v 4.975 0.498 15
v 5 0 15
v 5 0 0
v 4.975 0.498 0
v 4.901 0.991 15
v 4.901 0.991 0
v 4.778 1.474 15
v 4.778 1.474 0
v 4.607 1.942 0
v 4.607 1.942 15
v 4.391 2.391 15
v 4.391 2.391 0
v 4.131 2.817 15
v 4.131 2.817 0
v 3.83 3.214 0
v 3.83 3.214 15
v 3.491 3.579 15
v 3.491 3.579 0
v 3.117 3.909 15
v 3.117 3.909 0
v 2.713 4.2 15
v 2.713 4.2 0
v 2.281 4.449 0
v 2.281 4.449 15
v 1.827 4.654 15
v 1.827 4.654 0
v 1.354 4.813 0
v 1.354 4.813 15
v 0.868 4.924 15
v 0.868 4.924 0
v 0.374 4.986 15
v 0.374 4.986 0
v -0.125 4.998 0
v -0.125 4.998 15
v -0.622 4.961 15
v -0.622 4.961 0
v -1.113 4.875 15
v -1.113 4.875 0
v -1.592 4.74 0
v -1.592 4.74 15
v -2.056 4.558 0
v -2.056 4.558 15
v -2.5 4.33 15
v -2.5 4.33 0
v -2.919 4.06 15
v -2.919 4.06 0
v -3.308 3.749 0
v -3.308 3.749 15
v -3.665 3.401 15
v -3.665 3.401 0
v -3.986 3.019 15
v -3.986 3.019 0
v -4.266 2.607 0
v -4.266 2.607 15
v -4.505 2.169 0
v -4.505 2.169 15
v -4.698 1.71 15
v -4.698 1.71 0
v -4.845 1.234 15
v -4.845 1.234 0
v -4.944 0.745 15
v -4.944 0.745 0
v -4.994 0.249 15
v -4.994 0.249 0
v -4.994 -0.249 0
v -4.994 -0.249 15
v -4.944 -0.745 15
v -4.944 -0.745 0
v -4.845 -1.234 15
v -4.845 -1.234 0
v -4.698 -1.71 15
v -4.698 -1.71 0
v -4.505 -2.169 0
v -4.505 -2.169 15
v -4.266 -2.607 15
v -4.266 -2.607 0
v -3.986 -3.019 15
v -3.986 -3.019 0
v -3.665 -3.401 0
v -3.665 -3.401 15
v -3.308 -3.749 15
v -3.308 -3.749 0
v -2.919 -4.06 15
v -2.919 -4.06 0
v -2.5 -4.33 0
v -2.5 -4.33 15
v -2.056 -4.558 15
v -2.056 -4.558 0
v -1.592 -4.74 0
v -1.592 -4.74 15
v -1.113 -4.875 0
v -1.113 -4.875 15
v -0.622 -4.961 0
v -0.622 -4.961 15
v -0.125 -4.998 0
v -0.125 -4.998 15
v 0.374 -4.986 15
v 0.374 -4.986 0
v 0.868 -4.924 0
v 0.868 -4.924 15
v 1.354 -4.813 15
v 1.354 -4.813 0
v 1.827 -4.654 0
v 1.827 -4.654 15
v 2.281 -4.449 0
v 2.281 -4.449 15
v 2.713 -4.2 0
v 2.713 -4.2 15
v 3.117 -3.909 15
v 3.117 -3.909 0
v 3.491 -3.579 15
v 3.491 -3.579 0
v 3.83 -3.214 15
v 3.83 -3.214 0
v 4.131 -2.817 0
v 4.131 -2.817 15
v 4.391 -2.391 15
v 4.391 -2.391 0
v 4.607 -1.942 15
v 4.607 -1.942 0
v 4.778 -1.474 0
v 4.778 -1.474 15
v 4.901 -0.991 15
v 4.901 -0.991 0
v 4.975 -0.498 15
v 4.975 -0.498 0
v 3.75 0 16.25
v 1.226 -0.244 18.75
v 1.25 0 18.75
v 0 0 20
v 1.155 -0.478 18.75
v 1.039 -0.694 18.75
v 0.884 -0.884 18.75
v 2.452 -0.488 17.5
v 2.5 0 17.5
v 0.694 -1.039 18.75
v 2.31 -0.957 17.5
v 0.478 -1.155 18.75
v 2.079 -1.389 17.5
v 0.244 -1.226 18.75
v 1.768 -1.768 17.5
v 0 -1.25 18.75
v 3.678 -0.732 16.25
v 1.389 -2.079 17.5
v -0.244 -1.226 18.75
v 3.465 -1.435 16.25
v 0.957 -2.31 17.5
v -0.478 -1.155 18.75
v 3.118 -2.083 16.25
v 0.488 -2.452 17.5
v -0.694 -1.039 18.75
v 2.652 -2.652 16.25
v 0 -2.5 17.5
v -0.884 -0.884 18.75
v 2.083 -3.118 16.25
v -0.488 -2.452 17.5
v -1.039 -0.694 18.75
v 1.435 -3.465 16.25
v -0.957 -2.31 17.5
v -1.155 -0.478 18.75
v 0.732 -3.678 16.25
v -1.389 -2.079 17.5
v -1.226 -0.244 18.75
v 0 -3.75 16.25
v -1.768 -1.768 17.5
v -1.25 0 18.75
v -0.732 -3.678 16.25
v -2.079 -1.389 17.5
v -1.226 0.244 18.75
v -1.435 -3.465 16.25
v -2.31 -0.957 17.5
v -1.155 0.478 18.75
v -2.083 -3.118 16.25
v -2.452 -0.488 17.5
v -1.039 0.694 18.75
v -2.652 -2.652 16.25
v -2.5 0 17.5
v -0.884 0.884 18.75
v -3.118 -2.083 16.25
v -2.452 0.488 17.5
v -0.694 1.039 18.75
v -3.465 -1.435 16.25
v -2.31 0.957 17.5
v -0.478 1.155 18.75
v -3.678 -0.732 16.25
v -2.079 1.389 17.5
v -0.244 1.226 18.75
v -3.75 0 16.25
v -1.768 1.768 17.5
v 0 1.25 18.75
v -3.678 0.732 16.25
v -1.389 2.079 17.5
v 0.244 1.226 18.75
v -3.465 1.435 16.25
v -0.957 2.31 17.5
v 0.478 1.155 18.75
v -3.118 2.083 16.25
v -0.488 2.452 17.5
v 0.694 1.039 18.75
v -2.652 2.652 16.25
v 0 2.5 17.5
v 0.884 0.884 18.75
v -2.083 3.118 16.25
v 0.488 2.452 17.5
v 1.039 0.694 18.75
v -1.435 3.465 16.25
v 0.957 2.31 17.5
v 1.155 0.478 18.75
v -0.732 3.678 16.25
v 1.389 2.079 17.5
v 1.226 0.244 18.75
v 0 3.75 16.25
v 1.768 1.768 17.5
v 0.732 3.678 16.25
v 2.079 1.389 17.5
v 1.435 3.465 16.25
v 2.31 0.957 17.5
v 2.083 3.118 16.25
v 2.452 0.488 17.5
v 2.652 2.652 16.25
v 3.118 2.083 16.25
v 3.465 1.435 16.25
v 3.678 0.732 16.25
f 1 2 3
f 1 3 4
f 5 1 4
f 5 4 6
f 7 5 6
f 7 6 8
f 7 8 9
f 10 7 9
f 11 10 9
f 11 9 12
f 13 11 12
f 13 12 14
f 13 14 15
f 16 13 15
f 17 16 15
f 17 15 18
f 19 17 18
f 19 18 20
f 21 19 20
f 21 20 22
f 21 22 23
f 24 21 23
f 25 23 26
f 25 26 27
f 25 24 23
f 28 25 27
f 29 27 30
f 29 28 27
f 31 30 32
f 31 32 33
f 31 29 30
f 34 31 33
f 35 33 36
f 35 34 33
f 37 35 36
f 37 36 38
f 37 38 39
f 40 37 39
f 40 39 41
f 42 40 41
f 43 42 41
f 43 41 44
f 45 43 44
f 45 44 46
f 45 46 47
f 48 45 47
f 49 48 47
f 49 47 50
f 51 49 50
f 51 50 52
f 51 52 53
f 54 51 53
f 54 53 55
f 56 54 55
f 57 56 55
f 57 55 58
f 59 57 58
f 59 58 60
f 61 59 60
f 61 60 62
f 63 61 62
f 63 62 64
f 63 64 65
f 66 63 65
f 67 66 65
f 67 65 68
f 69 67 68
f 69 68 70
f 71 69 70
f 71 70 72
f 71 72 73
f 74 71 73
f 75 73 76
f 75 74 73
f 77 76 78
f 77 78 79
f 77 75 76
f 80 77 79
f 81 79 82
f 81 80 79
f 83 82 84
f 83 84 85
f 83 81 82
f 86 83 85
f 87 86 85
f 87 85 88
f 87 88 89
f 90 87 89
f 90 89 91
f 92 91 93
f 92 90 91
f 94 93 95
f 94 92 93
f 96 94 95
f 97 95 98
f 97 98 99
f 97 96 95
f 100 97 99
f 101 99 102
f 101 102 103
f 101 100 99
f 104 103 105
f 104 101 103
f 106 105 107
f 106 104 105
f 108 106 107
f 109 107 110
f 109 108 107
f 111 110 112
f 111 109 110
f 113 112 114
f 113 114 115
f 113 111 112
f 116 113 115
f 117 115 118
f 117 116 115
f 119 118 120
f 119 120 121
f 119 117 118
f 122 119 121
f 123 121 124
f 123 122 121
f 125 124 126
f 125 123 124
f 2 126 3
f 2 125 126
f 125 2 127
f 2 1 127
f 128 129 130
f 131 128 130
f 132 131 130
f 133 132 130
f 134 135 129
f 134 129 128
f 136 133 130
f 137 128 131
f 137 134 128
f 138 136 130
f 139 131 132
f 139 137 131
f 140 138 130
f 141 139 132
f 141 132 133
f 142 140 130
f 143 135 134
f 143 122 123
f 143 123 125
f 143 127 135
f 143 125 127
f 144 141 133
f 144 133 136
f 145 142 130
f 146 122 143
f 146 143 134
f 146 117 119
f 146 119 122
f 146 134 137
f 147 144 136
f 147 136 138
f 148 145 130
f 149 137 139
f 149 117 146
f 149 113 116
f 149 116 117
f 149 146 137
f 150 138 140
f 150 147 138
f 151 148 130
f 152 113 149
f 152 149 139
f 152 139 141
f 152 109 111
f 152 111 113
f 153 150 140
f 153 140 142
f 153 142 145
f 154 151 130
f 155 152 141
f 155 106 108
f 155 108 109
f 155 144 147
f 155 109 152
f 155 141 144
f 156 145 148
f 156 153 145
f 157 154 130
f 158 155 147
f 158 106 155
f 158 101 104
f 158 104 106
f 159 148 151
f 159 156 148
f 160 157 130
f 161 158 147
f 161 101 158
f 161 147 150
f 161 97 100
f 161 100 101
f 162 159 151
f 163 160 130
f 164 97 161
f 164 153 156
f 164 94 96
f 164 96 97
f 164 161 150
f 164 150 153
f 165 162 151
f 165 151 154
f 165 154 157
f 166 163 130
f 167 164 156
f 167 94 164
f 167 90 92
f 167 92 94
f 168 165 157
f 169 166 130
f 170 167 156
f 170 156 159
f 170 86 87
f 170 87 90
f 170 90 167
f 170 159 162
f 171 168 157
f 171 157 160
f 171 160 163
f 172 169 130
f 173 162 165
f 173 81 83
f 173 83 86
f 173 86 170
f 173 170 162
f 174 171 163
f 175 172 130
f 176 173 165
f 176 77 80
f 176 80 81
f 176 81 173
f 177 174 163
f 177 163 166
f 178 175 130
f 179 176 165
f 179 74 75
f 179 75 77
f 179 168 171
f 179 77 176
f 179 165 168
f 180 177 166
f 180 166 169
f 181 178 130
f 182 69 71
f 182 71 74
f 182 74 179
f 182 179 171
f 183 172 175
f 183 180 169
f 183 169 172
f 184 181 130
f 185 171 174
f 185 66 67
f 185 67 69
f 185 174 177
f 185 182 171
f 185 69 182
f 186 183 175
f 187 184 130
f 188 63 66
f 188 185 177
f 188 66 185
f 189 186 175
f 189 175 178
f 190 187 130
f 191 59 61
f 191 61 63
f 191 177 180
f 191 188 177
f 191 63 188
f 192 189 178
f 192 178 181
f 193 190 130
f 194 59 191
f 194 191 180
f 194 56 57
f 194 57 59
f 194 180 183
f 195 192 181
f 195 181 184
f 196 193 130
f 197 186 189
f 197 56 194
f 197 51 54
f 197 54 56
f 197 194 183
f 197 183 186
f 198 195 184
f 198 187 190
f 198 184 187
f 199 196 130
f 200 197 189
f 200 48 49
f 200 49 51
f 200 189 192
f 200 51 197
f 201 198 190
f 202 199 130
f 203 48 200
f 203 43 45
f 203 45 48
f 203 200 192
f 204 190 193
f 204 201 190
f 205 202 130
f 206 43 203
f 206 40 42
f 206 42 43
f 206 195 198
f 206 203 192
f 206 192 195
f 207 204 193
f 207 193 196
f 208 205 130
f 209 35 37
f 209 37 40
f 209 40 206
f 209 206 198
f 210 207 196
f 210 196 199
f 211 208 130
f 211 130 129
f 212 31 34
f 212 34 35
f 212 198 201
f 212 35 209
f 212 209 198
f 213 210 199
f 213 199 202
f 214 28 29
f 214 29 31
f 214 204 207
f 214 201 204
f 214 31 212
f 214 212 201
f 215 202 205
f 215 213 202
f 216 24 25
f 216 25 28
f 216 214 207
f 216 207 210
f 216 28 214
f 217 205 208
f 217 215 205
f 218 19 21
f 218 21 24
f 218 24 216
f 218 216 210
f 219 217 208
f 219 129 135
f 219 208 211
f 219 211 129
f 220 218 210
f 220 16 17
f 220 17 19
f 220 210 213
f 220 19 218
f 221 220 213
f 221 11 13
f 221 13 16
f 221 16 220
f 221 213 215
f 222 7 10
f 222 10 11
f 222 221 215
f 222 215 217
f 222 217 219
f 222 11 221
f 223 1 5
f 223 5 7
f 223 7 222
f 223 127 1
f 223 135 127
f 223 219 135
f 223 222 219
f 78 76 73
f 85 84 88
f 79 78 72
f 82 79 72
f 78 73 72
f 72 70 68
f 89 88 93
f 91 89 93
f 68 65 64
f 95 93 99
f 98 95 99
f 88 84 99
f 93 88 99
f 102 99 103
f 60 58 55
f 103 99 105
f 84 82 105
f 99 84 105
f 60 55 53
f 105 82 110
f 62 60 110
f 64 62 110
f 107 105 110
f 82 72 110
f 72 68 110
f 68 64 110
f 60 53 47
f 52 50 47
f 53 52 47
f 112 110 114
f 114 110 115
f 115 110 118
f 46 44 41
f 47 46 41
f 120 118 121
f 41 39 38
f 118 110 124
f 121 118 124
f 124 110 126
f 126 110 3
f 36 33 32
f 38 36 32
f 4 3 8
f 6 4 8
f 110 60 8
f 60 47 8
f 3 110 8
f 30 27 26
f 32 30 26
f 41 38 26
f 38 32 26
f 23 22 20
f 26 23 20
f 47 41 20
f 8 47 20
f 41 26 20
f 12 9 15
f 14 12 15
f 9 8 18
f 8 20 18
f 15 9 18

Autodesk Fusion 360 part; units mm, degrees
cylinder "CylinderPrimitive1" add diameter 10 height 20 placed x (1, 0, 0) y (0, 1, 0) z (0, 0, 1) at (0, 0, 0)
chamfer "Chamfer1" distance 5 angle 45 1 edges at (-4.6616, -1.8081, 20)
component "Base" placed x (1, 0, 0) y (0, 1, 0) z (0, 0, 1) at (0, 0, 0)
